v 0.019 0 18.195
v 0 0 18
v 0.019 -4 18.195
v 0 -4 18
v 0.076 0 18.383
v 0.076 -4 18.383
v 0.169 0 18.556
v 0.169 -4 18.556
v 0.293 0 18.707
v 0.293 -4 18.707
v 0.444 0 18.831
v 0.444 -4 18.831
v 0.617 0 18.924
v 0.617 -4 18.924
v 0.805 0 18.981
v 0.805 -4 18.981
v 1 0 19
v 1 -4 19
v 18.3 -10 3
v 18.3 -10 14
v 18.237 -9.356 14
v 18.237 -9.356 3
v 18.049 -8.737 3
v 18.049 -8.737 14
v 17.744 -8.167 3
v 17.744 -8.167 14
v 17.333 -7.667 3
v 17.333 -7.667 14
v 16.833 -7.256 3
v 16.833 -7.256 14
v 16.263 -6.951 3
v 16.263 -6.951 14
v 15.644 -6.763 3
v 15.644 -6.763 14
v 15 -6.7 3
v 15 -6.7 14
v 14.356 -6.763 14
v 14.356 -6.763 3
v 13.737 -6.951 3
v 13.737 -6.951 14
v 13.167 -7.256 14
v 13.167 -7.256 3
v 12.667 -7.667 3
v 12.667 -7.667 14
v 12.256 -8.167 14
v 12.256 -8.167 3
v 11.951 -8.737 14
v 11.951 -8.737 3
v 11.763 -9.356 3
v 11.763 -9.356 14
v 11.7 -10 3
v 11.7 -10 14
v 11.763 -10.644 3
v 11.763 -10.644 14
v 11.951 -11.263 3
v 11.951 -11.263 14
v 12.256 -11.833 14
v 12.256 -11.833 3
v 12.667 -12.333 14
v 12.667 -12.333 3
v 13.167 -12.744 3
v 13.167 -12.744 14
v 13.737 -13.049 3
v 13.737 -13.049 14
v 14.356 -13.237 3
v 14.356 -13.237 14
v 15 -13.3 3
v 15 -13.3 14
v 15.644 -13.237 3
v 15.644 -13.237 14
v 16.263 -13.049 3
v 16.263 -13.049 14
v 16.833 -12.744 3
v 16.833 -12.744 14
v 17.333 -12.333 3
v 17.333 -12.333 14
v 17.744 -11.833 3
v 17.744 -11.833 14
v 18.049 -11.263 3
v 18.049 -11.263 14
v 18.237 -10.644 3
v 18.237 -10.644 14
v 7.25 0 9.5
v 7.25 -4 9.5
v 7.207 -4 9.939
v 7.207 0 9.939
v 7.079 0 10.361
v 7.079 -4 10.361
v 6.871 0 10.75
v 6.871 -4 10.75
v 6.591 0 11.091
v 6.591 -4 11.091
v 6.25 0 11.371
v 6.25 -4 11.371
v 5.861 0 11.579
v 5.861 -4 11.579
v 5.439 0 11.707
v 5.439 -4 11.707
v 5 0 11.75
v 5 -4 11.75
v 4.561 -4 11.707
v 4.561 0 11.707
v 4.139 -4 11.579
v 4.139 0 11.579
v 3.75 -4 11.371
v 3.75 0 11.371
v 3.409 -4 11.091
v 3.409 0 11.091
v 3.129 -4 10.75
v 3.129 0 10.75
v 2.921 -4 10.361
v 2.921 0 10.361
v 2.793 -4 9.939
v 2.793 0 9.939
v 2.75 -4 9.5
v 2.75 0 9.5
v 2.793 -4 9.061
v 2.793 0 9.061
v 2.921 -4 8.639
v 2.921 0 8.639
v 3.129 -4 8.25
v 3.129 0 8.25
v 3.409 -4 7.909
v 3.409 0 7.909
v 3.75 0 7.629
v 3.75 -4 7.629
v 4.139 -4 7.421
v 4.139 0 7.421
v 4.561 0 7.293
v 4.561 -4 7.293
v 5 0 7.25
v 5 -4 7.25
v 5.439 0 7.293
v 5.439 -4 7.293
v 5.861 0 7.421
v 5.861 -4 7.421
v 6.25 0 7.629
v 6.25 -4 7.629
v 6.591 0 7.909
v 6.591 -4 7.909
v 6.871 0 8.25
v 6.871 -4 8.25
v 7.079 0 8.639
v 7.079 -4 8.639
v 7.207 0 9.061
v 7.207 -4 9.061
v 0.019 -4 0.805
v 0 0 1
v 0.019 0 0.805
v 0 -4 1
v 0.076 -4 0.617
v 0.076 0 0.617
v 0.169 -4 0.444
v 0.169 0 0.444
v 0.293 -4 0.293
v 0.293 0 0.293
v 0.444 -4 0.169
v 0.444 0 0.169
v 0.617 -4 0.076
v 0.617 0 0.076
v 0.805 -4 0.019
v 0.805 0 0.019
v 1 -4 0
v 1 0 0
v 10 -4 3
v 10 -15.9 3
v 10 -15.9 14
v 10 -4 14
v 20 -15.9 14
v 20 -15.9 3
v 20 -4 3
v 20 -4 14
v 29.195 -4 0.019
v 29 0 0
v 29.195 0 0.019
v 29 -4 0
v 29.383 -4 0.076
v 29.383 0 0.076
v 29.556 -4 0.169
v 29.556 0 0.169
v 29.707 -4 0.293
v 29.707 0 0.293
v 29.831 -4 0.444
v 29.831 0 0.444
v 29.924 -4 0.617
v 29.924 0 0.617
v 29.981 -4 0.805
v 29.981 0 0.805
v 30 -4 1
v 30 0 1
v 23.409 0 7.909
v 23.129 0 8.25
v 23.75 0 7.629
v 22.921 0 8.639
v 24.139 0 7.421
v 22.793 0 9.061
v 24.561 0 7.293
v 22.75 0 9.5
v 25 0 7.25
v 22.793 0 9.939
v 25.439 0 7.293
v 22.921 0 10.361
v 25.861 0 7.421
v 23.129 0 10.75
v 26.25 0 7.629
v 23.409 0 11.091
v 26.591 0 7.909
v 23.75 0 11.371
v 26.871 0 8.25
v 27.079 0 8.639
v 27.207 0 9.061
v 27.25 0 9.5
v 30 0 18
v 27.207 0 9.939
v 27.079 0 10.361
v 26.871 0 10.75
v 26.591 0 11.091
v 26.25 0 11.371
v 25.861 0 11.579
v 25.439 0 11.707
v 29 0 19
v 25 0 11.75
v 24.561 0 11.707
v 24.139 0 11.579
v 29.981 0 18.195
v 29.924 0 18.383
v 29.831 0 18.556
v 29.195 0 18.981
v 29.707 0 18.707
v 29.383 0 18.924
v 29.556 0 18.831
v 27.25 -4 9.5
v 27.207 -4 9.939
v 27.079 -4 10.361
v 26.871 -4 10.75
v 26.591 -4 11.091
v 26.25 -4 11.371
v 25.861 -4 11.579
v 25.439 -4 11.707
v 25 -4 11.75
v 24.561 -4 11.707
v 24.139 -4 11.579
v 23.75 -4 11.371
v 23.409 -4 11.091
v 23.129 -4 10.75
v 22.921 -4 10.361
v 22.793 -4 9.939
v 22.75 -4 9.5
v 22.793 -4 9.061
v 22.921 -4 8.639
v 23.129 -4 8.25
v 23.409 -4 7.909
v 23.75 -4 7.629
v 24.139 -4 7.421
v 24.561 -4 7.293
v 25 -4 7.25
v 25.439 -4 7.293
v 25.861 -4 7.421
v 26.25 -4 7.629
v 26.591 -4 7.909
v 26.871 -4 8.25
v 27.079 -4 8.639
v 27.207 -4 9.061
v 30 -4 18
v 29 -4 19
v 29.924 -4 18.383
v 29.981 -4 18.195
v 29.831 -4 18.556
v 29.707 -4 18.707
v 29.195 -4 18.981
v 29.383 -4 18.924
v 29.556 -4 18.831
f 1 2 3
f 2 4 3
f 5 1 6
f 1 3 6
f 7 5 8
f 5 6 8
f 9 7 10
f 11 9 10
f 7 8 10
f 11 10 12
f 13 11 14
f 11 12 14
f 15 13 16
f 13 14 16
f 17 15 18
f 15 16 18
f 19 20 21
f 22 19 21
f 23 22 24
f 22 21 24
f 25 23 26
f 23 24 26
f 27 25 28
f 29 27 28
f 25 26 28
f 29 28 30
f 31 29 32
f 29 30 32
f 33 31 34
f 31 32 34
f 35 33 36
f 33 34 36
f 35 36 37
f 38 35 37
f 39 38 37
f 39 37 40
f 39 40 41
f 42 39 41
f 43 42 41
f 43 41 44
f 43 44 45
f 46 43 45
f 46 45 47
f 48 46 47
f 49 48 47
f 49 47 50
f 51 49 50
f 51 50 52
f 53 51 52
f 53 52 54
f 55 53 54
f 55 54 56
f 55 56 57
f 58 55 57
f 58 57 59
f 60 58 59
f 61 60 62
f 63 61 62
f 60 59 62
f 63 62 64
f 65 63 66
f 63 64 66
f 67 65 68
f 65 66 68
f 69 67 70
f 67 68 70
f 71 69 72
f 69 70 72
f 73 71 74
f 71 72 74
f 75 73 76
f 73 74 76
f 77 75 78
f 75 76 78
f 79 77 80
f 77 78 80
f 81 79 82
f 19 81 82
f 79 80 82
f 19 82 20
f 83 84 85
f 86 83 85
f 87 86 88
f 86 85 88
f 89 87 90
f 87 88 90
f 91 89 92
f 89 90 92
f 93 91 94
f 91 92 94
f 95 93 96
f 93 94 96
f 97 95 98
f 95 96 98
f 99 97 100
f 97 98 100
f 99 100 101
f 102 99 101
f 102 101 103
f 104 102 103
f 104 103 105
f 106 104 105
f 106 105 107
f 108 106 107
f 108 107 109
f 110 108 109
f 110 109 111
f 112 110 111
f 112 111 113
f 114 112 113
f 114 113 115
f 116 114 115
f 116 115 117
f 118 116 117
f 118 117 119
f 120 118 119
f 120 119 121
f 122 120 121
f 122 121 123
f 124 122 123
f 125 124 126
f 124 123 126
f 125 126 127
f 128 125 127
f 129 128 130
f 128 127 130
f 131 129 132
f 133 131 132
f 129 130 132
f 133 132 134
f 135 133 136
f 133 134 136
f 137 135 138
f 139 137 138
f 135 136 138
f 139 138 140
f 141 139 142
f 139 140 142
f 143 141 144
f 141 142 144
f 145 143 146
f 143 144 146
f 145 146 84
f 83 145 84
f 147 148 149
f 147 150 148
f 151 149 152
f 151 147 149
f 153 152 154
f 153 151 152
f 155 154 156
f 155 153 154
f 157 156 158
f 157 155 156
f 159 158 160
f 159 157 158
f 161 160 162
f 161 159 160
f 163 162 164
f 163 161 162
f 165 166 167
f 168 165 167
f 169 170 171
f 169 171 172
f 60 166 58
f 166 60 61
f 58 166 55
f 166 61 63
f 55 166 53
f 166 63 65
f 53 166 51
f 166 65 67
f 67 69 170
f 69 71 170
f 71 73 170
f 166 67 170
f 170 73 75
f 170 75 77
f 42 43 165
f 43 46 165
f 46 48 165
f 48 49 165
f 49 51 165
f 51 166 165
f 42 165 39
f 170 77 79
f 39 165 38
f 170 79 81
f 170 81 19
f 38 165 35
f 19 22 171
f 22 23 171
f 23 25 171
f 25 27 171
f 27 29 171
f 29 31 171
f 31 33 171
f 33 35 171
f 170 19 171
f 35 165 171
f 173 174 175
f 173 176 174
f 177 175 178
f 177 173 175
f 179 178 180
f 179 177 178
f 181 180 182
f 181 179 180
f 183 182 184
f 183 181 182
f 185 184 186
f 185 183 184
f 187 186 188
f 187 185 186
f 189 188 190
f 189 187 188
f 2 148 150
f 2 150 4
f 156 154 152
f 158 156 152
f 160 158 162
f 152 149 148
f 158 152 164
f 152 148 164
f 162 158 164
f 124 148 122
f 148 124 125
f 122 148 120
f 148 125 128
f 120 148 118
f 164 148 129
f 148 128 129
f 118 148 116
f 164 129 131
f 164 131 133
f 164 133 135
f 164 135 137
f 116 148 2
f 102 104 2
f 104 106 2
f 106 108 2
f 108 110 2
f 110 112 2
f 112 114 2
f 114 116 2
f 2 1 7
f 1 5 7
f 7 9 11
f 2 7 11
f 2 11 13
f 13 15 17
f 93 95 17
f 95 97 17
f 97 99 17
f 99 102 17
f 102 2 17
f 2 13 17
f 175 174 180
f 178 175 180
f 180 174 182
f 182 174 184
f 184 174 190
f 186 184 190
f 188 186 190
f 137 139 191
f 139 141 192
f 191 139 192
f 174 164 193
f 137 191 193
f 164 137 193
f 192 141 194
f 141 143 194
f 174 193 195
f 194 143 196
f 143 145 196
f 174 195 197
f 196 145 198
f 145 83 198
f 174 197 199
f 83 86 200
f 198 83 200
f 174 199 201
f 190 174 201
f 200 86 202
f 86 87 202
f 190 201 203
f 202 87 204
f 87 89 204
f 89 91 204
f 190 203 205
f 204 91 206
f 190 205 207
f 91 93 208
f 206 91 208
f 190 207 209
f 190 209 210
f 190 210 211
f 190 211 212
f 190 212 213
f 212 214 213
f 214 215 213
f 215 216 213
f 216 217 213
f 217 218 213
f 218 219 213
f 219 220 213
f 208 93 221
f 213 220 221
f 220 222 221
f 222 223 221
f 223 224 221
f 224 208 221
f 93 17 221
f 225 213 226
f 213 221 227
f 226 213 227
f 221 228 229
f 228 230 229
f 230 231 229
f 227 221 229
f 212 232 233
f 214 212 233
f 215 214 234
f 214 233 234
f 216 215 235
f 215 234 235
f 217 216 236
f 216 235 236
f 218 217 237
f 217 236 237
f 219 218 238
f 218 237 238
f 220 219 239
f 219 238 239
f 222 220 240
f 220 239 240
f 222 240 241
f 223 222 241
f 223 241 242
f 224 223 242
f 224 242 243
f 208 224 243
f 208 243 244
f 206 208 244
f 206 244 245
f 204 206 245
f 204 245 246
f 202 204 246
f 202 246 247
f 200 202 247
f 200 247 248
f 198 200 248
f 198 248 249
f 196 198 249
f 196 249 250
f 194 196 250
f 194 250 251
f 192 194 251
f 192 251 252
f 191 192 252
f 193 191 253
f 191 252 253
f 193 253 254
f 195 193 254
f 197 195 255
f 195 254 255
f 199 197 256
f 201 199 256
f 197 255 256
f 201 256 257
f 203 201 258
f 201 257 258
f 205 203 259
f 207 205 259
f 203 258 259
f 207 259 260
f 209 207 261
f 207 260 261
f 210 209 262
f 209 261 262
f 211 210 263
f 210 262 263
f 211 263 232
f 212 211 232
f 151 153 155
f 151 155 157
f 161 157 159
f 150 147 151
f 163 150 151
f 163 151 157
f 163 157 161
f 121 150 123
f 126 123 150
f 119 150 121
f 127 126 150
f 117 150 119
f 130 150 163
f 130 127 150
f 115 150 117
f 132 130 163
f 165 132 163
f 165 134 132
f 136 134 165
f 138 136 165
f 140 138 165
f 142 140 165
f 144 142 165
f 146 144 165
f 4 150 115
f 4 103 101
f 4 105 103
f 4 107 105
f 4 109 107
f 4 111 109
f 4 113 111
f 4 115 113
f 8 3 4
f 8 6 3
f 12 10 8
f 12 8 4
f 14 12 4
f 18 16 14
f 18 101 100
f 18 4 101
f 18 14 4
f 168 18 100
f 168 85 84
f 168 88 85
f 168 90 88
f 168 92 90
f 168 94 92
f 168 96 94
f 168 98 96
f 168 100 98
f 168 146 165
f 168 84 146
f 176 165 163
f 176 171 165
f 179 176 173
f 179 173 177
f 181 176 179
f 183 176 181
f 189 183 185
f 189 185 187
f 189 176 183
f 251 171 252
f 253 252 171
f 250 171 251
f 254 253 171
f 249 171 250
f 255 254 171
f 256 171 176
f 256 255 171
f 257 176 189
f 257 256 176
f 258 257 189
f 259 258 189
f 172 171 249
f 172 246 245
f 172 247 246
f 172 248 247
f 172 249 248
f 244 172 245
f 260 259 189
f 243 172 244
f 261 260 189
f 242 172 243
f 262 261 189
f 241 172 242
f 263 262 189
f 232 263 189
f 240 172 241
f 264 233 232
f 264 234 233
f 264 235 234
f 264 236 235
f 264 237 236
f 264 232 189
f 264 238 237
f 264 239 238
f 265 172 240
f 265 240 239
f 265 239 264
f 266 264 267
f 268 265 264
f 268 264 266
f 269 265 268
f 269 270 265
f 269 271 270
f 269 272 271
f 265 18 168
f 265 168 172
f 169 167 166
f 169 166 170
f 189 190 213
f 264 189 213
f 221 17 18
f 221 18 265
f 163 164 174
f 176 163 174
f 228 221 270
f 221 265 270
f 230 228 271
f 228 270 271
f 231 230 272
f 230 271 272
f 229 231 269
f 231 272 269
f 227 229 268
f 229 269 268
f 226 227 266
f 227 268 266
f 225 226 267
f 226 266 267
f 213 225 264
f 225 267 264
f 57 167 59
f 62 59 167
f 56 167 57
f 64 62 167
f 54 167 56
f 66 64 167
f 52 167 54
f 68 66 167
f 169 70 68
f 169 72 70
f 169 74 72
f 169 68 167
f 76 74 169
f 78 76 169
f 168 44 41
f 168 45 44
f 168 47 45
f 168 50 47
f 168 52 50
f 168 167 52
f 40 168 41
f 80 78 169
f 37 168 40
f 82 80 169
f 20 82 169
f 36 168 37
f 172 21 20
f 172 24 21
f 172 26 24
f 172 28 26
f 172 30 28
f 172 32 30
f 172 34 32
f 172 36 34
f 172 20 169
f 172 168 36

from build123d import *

# Parameters (mm, degrees)
F0_W     = 30
F0_H     = 19
F1_DEPTH = 4
F2_R     = 2.25
F3_DEPTH = 25
F4_W     = 10
F4_H     = 11
F5_DEPTH = 11.9
F6_R     = 3.3
F7_DEPTH = 25
F8_R     = 1


with BuildPart() as f1:
    # F0 (on Front) → F1 (new body)
    with BuildSketch(Plane.XZ):
        with Locations((15, 9.5)):
            Rectangle(F0_W, F0_H)
    extrude(amount=F1_DEPTH)

    # F2 (on face) → F3 (cut)
    with BuildSketch(Plane.XZ.offset(4)):
        with Locations((25, 9.5)):
            Circle(F2_R)
        with Locations((5, 9.5)):
            Circle(F2_R)
    extrude(amount=-F3_DEPTH, mode=Mode.SUBTRACT)

    # F4 (on face) → F5 (join)
    with BuildSketch(Plane.XZ.offset(4)):
        with Locations((15, 8.5)):
            Rectangle(F4_W, F4_H)
    extrude(amount=F5_DEPTH)

    # F6 (on face) → F7 (cut)
    with BuildSketch(Plane.XY.offset(14)):
        with Locations((15, -10)):
            Circle(F6_R)
    extrude(amount=-F7_DEPTH, mode=Mode.SUBTRACT)

    # F8
    f8_edges = [f1.edges().sort_by_distance(p)[0] for p in [
        (0, -2, 19),
        (30, -2, 19),
        (30, -2, 0),
        (0, -2, 0),
    ]]
    fillet(f8_edges, radius=F8_R)


solid = f1.part
